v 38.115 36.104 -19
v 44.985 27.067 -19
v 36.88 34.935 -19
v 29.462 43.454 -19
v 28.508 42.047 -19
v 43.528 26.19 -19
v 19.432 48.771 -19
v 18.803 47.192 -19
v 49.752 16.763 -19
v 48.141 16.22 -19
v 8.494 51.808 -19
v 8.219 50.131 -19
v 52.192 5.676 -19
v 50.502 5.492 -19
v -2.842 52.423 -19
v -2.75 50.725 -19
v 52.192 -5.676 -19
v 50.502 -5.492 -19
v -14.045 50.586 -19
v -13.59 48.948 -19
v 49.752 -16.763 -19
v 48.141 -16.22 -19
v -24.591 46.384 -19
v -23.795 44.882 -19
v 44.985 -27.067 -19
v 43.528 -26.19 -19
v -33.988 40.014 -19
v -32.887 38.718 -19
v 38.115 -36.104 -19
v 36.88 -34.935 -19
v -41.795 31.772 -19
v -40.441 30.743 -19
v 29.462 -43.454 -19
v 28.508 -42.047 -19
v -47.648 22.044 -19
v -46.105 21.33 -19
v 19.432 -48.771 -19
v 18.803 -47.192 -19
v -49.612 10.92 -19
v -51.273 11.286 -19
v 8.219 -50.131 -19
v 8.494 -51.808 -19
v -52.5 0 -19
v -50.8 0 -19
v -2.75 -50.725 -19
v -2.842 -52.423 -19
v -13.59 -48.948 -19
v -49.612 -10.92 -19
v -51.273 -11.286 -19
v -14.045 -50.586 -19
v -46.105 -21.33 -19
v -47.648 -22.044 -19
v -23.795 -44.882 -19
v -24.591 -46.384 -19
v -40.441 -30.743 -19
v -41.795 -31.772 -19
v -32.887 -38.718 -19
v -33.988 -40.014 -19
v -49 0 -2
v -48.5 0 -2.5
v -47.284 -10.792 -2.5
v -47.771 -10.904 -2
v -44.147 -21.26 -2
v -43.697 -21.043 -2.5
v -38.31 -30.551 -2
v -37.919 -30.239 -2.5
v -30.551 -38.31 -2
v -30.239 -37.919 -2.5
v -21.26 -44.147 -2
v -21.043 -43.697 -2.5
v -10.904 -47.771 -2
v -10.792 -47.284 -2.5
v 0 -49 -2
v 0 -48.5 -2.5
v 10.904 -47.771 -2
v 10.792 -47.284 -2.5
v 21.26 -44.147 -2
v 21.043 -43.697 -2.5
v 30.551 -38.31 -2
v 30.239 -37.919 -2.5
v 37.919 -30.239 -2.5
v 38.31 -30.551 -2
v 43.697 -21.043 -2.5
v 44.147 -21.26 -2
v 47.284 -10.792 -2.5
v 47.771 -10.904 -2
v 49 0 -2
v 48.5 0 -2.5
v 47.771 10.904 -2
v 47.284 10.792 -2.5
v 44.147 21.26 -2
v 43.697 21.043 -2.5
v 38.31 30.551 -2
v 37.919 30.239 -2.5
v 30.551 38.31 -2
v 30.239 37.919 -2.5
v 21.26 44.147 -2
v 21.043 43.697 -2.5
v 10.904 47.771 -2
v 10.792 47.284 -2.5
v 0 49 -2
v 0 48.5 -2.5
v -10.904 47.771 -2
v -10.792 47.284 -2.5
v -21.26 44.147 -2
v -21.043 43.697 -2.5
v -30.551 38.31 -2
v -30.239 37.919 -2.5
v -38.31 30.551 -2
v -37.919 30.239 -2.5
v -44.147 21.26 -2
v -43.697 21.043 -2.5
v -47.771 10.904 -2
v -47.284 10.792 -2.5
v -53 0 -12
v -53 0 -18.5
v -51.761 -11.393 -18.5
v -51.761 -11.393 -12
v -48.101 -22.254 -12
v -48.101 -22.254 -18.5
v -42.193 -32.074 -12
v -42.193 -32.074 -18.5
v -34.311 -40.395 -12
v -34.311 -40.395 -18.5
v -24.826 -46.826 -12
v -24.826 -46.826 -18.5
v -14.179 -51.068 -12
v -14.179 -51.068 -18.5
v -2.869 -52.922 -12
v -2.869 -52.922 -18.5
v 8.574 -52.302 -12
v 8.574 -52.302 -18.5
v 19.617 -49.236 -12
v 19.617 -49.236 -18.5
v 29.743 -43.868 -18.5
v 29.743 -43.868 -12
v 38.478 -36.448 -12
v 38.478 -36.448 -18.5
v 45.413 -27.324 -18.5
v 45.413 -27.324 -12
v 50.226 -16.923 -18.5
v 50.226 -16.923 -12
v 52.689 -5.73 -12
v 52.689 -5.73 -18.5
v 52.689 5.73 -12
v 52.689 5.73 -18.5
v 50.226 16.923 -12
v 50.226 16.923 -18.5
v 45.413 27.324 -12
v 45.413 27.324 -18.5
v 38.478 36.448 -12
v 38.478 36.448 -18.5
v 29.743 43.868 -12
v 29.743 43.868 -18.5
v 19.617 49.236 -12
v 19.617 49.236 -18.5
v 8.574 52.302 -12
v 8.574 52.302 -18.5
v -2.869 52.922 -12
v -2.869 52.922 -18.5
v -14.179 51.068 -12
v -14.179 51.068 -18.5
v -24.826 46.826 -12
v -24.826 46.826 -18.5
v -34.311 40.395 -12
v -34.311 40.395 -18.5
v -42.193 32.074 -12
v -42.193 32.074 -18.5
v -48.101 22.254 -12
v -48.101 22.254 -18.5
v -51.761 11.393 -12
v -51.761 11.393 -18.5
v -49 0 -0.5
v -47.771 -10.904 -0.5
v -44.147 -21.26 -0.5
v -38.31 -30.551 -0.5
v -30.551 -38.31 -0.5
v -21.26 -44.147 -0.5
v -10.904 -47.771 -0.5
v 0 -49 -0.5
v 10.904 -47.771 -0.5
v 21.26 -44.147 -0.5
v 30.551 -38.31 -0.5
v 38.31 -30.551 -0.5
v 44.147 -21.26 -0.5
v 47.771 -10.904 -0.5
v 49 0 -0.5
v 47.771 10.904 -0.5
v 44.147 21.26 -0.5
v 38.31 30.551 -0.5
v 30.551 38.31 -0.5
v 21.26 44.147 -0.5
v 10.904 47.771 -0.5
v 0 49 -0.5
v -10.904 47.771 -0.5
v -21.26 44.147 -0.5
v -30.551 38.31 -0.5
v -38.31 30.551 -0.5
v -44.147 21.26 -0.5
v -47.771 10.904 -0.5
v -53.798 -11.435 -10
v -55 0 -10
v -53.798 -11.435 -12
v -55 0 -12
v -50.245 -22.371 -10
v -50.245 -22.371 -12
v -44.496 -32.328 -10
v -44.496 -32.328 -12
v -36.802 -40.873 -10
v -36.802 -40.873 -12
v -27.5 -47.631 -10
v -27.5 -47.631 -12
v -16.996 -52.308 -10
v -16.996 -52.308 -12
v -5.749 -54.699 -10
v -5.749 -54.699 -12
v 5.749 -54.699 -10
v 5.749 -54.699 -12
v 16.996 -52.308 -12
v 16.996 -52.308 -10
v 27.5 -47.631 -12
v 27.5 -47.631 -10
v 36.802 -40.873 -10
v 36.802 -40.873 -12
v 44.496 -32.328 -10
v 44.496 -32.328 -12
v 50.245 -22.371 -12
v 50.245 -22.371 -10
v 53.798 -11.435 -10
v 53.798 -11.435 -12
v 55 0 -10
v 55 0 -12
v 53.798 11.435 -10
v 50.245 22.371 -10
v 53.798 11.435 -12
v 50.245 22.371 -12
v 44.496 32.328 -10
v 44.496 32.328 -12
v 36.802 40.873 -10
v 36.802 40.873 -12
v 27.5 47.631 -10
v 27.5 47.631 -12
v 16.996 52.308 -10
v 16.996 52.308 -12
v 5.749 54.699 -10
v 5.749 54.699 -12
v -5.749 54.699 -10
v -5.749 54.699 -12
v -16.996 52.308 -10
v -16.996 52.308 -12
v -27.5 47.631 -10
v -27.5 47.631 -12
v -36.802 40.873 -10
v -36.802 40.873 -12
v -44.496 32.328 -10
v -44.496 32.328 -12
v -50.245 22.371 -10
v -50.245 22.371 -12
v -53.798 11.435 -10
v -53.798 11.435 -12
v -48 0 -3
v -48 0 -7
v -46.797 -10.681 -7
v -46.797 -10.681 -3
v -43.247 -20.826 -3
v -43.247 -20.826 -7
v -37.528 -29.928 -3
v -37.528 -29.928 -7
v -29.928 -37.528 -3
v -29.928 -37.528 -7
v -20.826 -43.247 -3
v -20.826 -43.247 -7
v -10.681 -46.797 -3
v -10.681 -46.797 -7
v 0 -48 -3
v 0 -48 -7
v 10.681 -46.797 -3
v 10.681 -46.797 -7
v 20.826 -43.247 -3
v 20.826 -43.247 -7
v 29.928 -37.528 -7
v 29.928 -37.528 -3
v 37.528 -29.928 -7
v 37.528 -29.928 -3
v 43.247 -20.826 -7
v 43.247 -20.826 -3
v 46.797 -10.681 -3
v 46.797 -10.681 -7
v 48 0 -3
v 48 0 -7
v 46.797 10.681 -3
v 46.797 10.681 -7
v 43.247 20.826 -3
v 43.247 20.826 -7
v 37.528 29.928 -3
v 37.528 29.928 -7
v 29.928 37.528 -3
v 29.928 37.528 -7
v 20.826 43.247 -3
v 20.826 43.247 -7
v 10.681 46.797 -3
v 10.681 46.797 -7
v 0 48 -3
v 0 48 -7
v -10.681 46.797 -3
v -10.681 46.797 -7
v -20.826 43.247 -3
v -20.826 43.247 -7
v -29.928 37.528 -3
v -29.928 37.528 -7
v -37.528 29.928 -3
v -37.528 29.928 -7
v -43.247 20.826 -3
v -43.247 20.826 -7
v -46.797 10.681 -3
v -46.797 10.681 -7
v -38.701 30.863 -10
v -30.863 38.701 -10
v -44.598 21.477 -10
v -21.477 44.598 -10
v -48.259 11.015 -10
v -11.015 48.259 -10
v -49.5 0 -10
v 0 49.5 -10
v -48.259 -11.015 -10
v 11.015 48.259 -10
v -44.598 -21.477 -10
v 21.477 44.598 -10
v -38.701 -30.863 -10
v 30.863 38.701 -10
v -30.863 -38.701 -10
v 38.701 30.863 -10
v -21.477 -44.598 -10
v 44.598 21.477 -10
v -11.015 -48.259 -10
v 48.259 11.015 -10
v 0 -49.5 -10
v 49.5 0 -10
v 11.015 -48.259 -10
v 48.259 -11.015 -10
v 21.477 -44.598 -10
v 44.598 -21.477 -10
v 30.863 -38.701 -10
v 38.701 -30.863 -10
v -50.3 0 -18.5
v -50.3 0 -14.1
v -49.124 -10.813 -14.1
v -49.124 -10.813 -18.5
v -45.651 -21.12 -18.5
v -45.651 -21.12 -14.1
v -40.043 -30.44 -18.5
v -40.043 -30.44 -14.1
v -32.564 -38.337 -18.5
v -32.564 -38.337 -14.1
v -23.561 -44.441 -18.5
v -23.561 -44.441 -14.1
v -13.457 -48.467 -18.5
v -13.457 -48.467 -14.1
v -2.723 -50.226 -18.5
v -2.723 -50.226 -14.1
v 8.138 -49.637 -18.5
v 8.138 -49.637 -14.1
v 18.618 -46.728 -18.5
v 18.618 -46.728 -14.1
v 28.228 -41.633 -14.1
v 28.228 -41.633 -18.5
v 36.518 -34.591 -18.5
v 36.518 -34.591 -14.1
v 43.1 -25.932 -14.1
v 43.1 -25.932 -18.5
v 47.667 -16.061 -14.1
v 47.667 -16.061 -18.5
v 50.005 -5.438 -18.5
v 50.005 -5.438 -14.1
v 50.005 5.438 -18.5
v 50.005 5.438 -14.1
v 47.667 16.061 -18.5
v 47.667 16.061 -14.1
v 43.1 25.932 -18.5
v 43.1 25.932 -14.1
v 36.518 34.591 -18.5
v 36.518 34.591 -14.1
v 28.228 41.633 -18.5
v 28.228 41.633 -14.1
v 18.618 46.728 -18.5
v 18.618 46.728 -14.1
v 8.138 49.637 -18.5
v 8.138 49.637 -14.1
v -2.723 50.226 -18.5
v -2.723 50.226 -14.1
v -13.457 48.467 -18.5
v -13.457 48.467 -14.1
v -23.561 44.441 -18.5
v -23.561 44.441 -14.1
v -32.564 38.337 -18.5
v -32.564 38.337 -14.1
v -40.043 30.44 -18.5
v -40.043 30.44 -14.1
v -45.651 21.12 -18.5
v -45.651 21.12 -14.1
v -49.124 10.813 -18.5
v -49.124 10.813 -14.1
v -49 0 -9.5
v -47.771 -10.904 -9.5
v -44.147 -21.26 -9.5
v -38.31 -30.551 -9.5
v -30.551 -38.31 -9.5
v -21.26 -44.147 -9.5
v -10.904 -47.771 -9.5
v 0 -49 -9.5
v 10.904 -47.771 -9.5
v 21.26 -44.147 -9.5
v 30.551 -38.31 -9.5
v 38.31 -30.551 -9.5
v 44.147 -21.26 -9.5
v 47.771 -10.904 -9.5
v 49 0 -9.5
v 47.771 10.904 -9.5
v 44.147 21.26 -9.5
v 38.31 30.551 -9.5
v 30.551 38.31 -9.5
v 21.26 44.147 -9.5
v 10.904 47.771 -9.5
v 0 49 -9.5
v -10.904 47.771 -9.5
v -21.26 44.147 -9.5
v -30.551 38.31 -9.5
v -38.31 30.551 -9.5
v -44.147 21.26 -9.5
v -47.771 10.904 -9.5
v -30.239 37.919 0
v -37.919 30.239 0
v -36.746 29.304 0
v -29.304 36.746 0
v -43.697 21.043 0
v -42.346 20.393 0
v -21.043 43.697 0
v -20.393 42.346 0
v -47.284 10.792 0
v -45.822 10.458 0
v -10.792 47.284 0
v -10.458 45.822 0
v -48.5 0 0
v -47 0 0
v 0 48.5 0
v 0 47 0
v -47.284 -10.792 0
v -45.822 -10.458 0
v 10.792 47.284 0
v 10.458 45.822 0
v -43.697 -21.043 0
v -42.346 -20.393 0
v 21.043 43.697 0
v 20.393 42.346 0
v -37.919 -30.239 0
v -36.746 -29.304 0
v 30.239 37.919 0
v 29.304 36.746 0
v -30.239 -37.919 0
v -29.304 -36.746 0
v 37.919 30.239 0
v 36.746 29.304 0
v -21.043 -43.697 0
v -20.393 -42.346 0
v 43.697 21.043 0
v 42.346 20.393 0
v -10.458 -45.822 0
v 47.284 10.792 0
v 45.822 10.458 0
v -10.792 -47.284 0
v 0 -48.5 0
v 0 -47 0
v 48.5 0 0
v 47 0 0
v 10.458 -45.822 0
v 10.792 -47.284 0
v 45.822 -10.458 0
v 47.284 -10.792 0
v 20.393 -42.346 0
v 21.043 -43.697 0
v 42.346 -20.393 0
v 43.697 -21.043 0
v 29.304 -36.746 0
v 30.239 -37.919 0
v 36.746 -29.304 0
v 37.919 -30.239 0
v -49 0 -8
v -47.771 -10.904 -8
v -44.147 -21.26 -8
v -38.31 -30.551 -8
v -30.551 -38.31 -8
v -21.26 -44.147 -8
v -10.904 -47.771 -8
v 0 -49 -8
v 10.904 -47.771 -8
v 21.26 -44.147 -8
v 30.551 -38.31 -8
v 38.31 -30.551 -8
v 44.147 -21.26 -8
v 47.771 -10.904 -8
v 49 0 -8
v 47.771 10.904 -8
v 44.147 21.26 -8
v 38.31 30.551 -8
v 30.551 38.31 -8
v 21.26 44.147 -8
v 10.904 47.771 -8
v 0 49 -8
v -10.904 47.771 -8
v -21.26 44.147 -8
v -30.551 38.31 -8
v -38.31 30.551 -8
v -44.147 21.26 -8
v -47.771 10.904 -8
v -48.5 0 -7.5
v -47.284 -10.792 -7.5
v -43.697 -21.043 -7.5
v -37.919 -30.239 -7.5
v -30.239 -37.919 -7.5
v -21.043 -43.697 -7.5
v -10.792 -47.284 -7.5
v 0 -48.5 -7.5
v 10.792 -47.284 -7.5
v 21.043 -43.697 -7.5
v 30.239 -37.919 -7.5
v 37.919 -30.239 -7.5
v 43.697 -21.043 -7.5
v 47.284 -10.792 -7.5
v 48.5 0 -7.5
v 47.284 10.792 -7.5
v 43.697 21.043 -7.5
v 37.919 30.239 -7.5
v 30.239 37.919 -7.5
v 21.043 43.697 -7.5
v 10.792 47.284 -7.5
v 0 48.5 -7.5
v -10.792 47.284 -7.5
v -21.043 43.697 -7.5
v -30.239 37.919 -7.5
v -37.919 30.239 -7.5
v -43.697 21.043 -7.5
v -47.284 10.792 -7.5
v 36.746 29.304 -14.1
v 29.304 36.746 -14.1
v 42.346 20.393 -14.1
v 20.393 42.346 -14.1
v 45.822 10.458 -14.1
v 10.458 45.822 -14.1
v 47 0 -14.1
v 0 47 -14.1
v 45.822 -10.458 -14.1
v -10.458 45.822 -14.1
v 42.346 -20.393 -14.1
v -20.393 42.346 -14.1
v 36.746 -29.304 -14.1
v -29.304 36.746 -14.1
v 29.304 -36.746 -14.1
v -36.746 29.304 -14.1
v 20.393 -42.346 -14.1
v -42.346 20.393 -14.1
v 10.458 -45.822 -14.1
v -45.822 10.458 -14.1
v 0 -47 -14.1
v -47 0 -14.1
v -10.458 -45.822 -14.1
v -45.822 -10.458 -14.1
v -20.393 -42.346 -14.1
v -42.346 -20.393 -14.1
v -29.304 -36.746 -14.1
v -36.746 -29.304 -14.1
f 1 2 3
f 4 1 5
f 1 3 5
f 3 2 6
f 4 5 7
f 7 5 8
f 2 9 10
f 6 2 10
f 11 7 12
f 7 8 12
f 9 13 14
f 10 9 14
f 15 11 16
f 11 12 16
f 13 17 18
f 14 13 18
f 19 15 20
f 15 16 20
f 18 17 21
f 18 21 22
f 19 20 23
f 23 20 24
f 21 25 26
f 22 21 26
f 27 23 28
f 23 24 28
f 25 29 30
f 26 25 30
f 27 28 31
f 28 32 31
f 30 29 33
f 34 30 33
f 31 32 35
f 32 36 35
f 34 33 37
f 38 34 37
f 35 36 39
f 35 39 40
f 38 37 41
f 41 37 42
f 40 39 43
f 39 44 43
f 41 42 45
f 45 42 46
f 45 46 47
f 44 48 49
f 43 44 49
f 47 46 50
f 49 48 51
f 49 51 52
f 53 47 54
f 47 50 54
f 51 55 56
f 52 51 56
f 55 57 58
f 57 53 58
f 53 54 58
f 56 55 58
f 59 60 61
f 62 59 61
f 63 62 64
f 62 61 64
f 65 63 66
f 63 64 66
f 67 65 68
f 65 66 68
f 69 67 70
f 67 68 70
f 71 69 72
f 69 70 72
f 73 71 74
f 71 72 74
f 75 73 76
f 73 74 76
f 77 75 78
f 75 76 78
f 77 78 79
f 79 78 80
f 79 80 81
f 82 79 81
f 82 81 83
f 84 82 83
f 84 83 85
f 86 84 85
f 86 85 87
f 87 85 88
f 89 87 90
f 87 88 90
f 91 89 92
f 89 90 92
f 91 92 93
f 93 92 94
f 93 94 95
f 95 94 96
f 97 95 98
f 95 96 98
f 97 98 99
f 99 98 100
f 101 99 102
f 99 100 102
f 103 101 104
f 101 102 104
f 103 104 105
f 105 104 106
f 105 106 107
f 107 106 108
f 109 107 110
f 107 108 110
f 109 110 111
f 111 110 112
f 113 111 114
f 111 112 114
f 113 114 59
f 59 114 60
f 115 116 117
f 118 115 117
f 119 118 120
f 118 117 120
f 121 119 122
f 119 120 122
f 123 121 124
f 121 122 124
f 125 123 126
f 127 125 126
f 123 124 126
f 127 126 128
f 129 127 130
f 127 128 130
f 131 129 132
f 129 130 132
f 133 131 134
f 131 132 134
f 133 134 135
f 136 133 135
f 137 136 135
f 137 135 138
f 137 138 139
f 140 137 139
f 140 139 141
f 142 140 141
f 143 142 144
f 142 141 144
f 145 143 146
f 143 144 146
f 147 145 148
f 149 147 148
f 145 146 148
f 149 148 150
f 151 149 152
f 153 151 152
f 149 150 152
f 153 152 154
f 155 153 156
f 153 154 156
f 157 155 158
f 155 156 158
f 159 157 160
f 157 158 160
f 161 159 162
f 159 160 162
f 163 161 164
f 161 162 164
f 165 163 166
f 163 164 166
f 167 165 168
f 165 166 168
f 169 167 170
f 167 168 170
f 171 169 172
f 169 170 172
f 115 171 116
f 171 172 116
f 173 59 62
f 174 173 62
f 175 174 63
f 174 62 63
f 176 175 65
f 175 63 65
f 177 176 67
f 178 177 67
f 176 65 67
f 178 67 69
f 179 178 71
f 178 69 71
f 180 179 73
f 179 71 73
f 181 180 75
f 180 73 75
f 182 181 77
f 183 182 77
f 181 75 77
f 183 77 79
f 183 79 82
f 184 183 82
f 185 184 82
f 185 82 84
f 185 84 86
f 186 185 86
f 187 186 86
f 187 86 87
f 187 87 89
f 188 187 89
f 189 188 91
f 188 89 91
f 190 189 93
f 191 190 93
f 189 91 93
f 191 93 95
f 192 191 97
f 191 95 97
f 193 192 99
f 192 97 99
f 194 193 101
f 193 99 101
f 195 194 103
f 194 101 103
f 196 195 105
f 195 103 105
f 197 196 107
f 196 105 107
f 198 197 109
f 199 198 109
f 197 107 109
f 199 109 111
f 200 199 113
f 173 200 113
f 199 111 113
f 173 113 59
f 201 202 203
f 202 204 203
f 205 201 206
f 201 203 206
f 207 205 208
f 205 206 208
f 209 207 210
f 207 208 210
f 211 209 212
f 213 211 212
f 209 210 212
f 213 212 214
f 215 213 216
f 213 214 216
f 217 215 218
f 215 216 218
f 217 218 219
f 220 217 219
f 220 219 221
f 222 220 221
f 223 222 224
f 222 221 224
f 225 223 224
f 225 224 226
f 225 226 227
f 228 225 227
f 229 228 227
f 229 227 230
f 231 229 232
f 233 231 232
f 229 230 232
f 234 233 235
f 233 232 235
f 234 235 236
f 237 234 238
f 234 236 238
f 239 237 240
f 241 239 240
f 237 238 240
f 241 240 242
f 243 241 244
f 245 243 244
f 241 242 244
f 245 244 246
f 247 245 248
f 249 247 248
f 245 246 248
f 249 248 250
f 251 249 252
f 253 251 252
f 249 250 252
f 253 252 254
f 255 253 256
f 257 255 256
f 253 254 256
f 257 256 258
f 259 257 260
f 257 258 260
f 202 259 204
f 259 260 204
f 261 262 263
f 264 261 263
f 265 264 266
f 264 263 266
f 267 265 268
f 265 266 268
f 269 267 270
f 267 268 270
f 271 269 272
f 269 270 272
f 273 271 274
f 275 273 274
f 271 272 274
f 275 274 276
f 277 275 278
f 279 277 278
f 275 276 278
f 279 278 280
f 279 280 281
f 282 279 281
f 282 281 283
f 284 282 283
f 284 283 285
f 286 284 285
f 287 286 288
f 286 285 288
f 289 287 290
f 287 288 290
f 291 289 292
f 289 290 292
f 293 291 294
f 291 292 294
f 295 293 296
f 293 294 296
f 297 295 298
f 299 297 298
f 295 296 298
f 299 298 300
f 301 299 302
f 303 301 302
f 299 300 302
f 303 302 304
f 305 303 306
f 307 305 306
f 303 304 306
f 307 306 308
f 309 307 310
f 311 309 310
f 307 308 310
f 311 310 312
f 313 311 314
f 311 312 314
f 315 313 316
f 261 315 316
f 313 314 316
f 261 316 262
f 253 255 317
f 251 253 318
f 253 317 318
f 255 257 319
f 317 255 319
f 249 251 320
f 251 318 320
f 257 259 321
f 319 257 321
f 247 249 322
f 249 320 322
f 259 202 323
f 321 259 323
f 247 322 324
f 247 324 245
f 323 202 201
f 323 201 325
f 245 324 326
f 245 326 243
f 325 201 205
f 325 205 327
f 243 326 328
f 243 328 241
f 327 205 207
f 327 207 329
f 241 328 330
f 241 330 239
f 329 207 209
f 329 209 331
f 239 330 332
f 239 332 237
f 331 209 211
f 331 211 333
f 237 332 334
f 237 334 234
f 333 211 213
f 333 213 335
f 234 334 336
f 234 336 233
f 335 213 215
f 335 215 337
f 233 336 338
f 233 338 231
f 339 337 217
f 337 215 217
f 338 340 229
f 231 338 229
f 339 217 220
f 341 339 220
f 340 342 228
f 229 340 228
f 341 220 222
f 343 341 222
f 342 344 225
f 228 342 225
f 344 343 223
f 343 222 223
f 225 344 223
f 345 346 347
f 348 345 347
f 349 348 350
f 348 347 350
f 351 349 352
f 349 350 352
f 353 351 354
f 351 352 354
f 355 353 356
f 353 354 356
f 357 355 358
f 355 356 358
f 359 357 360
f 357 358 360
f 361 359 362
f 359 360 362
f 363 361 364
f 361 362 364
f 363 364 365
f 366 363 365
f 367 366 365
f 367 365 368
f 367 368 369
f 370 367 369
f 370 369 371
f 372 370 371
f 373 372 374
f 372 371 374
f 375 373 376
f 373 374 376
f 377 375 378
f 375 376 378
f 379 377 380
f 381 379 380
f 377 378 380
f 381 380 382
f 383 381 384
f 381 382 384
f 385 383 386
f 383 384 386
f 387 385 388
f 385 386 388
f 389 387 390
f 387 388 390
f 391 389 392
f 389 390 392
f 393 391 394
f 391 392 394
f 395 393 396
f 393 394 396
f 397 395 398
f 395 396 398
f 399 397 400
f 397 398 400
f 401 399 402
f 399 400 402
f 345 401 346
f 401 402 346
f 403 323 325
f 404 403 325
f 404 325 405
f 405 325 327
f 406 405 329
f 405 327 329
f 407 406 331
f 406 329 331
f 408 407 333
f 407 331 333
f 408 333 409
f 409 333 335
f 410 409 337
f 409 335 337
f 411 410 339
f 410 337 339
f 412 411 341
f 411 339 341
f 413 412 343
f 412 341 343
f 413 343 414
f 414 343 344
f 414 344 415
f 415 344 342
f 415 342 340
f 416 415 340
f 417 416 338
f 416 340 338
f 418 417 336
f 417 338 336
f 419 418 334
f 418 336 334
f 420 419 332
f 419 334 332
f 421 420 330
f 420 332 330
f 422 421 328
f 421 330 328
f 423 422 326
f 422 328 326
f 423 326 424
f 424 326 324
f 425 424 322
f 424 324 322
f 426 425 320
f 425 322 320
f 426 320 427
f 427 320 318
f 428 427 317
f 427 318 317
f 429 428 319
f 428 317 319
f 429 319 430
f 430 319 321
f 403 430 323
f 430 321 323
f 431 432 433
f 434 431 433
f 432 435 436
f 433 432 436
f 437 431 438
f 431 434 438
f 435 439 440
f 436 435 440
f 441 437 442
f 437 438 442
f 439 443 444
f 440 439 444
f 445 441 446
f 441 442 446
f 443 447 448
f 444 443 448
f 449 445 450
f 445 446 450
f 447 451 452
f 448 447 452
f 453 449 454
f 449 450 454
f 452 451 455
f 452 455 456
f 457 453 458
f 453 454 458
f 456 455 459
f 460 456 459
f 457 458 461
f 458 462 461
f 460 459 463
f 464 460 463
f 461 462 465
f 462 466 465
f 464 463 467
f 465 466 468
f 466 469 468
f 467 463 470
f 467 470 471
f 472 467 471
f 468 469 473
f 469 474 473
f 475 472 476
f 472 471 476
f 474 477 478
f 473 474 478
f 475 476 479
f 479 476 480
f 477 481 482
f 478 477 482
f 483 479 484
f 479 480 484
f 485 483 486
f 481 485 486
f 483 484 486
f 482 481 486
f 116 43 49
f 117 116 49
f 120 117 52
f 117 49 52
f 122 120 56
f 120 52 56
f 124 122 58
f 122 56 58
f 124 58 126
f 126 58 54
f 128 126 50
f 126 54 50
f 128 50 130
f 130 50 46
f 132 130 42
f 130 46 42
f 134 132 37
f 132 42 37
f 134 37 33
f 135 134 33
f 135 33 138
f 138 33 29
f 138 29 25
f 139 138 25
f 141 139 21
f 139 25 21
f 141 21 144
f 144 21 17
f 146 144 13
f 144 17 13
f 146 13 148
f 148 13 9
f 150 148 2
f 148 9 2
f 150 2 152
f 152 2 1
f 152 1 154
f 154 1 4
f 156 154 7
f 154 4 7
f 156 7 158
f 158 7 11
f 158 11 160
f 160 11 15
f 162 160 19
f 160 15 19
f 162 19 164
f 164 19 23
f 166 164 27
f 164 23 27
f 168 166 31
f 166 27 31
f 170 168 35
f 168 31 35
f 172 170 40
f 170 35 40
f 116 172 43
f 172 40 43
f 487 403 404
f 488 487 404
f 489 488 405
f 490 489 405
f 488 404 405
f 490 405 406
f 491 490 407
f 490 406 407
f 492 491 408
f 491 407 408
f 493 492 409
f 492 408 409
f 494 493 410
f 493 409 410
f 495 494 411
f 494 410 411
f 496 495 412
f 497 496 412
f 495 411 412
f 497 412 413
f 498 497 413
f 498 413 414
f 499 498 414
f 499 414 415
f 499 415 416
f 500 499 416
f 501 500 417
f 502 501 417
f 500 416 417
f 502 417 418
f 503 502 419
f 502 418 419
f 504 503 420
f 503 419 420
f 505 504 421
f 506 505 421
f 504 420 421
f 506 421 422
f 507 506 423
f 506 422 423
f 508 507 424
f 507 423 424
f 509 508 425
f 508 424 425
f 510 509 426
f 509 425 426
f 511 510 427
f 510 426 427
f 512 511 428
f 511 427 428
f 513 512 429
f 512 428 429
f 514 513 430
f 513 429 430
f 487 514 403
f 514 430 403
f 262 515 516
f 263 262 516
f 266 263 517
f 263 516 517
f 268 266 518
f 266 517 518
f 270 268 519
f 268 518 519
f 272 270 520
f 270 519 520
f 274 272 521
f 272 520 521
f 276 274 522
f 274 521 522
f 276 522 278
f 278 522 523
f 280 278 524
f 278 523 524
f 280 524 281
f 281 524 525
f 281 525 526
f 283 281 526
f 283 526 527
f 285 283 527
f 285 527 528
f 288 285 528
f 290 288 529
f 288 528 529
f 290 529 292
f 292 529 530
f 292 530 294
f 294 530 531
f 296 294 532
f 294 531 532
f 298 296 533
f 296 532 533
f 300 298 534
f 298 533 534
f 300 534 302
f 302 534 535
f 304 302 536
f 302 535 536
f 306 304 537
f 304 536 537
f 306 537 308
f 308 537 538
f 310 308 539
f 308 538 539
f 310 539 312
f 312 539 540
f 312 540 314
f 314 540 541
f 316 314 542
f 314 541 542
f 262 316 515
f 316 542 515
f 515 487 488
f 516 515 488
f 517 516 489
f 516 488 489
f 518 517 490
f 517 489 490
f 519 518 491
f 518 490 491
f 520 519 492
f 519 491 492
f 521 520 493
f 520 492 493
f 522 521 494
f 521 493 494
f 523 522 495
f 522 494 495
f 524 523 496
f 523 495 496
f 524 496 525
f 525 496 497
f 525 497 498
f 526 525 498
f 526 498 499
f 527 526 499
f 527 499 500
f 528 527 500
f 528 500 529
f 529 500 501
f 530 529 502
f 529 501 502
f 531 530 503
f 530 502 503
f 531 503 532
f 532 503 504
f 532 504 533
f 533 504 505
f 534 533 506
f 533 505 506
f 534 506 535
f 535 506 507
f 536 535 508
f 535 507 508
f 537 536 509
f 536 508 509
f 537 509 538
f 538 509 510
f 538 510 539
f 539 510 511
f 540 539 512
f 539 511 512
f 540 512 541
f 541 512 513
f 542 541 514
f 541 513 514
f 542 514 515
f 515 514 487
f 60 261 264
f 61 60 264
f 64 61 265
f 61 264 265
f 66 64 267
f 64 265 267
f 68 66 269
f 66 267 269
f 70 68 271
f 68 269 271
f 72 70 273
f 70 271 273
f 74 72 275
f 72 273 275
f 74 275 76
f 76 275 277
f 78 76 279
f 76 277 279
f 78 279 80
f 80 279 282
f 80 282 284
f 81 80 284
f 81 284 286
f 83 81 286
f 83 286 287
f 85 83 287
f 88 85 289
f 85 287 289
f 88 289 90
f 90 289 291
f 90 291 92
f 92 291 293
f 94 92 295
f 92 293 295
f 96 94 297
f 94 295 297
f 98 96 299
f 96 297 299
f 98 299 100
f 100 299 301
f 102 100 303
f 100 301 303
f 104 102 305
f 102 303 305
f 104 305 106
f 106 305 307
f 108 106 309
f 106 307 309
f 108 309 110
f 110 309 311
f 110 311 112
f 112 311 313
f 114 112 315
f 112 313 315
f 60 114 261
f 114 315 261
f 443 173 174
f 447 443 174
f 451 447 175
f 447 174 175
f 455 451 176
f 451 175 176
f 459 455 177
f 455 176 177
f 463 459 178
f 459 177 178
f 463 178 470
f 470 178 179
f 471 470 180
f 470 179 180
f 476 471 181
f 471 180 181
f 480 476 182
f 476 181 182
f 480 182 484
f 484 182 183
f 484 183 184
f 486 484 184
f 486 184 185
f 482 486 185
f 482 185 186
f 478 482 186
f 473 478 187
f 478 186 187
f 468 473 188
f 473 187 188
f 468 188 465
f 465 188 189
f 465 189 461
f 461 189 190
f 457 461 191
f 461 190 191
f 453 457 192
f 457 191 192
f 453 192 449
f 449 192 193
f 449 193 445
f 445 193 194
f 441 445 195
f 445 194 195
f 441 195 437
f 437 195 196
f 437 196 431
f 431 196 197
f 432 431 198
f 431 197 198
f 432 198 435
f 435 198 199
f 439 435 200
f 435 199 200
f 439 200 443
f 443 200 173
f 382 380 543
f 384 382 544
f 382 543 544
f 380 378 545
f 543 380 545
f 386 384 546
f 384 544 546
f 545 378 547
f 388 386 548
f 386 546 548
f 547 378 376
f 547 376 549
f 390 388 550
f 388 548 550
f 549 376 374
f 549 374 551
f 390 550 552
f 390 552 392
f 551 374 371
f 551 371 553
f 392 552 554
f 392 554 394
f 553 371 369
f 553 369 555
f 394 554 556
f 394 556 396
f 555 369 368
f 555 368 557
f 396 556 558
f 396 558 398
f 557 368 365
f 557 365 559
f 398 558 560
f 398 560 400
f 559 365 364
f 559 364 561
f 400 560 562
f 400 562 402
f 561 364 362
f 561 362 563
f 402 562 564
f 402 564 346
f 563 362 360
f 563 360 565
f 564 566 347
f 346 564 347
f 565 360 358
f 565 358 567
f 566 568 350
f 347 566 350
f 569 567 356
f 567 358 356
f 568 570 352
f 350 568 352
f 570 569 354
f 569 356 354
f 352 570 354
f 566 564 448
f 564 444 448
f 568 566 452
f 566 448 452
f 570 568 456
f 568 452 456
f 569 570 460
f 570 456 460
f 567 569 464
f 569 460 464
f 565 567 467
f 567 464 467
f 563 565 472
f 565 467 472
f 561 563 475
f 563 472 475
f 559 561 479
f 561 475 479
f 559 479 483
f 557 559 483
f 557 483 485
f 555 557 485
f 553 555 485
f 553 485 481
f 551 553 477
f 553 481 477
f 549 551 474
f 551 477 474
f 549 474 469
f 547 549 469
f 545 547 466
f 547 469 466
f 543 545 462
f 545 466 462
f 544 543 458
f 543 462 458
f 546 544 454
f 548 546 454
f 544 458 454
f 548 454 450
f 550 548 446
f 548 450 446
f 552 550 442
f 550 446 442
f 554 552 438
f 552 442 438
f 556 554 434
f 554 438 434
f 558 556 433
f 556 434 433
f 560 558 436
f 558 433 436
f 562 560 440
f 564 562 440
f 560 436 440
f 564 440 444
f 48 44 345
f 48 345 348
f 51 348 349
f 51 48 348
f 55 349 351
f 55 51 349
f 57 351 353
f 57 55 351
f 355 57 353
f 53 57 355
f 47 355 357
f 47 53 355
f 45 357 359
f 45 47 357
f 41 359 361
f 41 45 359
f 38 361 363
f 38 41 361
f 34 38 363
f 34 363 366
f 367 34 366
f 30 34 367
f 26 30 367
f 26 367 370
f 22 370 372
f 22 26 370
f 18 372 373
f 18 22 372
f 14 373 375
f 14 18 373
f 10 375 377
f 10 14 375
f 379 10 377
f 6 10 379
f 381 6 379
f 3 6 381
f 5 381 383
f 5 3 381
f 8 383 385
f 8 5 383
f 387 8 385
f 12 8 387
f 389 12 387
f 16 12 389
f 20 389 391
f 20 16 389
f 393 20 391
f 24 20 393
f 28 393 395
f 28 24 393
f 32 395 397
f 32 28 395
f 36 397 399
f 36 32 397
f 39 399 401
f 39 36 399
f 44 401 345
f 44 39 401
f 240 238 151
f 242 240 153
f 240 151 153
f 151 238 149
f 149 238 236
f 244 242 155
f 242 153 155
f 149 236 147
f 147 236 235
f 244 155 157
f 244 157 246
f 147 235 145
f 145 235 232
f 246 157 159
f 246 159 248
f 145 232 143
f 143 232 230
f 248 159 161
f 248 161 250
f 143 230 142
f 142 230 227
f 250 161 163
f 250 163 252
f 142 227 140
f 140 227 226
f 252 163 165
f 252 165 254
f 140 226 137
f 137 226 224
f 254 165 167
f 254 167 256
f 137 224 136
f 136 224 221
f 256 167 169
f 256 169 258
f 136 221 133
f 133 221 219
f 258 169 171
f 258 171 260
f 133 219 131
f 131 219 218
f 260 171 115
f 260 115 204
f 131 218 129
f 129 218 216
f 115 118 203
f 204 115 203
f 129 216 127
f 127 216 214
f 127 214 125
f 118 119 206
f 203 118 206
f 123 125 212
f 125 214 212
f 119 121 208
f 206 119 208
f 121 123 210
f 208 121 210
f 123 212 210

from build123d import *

# Parameters (mm, degrees)
CHAMFER1_SIZE = 0.5


with BuildPart() as part:
    # Sketch1 → Revolve1 (revolve)
    with BuildSketch(Plane(origin=(0, 0, 0), x_dir=(1, 0, 0), z_dir=(0, 1, 0)), mode=Mode.PRIVATE) as revolve1_sk:
        Polygon((50.3, 19), (50.3, 14.1), (47, 14.1), (47, 0), (49, 0), (49, 2.5), (48, 2.5), (48, 7.5), (49, 7.5), (49, 10), (55, 10), (55, 12), (53, 12), (53, 19), align=None)
    revolve(revolve1_sk.sketch.rotate(Axis((0, 0, -69.169847328), (0, 0, 1)), 180), axis=Axis((0, 0, -69.169847328), (0, 0, 1)))

    # Chamfer1
    chamfer1_edges = [part.edges().sort_by_distance(p)[0] for p in [
        (49, 0, -10),
        (49, 0, -7.5),
        (48, 0, -7.5),
        (48, 0, -2.5),
        (49, 0, -2.5),
        (49, 0, 0),
        (50.3, 0, -19),
        (53, 0, -19),
    ]]
    chamfer(chamfer1_edges, length=CHAMFER1_SIZE - 0.0001)  # a hair under: the kernel refuses the full size


solid = part.part
